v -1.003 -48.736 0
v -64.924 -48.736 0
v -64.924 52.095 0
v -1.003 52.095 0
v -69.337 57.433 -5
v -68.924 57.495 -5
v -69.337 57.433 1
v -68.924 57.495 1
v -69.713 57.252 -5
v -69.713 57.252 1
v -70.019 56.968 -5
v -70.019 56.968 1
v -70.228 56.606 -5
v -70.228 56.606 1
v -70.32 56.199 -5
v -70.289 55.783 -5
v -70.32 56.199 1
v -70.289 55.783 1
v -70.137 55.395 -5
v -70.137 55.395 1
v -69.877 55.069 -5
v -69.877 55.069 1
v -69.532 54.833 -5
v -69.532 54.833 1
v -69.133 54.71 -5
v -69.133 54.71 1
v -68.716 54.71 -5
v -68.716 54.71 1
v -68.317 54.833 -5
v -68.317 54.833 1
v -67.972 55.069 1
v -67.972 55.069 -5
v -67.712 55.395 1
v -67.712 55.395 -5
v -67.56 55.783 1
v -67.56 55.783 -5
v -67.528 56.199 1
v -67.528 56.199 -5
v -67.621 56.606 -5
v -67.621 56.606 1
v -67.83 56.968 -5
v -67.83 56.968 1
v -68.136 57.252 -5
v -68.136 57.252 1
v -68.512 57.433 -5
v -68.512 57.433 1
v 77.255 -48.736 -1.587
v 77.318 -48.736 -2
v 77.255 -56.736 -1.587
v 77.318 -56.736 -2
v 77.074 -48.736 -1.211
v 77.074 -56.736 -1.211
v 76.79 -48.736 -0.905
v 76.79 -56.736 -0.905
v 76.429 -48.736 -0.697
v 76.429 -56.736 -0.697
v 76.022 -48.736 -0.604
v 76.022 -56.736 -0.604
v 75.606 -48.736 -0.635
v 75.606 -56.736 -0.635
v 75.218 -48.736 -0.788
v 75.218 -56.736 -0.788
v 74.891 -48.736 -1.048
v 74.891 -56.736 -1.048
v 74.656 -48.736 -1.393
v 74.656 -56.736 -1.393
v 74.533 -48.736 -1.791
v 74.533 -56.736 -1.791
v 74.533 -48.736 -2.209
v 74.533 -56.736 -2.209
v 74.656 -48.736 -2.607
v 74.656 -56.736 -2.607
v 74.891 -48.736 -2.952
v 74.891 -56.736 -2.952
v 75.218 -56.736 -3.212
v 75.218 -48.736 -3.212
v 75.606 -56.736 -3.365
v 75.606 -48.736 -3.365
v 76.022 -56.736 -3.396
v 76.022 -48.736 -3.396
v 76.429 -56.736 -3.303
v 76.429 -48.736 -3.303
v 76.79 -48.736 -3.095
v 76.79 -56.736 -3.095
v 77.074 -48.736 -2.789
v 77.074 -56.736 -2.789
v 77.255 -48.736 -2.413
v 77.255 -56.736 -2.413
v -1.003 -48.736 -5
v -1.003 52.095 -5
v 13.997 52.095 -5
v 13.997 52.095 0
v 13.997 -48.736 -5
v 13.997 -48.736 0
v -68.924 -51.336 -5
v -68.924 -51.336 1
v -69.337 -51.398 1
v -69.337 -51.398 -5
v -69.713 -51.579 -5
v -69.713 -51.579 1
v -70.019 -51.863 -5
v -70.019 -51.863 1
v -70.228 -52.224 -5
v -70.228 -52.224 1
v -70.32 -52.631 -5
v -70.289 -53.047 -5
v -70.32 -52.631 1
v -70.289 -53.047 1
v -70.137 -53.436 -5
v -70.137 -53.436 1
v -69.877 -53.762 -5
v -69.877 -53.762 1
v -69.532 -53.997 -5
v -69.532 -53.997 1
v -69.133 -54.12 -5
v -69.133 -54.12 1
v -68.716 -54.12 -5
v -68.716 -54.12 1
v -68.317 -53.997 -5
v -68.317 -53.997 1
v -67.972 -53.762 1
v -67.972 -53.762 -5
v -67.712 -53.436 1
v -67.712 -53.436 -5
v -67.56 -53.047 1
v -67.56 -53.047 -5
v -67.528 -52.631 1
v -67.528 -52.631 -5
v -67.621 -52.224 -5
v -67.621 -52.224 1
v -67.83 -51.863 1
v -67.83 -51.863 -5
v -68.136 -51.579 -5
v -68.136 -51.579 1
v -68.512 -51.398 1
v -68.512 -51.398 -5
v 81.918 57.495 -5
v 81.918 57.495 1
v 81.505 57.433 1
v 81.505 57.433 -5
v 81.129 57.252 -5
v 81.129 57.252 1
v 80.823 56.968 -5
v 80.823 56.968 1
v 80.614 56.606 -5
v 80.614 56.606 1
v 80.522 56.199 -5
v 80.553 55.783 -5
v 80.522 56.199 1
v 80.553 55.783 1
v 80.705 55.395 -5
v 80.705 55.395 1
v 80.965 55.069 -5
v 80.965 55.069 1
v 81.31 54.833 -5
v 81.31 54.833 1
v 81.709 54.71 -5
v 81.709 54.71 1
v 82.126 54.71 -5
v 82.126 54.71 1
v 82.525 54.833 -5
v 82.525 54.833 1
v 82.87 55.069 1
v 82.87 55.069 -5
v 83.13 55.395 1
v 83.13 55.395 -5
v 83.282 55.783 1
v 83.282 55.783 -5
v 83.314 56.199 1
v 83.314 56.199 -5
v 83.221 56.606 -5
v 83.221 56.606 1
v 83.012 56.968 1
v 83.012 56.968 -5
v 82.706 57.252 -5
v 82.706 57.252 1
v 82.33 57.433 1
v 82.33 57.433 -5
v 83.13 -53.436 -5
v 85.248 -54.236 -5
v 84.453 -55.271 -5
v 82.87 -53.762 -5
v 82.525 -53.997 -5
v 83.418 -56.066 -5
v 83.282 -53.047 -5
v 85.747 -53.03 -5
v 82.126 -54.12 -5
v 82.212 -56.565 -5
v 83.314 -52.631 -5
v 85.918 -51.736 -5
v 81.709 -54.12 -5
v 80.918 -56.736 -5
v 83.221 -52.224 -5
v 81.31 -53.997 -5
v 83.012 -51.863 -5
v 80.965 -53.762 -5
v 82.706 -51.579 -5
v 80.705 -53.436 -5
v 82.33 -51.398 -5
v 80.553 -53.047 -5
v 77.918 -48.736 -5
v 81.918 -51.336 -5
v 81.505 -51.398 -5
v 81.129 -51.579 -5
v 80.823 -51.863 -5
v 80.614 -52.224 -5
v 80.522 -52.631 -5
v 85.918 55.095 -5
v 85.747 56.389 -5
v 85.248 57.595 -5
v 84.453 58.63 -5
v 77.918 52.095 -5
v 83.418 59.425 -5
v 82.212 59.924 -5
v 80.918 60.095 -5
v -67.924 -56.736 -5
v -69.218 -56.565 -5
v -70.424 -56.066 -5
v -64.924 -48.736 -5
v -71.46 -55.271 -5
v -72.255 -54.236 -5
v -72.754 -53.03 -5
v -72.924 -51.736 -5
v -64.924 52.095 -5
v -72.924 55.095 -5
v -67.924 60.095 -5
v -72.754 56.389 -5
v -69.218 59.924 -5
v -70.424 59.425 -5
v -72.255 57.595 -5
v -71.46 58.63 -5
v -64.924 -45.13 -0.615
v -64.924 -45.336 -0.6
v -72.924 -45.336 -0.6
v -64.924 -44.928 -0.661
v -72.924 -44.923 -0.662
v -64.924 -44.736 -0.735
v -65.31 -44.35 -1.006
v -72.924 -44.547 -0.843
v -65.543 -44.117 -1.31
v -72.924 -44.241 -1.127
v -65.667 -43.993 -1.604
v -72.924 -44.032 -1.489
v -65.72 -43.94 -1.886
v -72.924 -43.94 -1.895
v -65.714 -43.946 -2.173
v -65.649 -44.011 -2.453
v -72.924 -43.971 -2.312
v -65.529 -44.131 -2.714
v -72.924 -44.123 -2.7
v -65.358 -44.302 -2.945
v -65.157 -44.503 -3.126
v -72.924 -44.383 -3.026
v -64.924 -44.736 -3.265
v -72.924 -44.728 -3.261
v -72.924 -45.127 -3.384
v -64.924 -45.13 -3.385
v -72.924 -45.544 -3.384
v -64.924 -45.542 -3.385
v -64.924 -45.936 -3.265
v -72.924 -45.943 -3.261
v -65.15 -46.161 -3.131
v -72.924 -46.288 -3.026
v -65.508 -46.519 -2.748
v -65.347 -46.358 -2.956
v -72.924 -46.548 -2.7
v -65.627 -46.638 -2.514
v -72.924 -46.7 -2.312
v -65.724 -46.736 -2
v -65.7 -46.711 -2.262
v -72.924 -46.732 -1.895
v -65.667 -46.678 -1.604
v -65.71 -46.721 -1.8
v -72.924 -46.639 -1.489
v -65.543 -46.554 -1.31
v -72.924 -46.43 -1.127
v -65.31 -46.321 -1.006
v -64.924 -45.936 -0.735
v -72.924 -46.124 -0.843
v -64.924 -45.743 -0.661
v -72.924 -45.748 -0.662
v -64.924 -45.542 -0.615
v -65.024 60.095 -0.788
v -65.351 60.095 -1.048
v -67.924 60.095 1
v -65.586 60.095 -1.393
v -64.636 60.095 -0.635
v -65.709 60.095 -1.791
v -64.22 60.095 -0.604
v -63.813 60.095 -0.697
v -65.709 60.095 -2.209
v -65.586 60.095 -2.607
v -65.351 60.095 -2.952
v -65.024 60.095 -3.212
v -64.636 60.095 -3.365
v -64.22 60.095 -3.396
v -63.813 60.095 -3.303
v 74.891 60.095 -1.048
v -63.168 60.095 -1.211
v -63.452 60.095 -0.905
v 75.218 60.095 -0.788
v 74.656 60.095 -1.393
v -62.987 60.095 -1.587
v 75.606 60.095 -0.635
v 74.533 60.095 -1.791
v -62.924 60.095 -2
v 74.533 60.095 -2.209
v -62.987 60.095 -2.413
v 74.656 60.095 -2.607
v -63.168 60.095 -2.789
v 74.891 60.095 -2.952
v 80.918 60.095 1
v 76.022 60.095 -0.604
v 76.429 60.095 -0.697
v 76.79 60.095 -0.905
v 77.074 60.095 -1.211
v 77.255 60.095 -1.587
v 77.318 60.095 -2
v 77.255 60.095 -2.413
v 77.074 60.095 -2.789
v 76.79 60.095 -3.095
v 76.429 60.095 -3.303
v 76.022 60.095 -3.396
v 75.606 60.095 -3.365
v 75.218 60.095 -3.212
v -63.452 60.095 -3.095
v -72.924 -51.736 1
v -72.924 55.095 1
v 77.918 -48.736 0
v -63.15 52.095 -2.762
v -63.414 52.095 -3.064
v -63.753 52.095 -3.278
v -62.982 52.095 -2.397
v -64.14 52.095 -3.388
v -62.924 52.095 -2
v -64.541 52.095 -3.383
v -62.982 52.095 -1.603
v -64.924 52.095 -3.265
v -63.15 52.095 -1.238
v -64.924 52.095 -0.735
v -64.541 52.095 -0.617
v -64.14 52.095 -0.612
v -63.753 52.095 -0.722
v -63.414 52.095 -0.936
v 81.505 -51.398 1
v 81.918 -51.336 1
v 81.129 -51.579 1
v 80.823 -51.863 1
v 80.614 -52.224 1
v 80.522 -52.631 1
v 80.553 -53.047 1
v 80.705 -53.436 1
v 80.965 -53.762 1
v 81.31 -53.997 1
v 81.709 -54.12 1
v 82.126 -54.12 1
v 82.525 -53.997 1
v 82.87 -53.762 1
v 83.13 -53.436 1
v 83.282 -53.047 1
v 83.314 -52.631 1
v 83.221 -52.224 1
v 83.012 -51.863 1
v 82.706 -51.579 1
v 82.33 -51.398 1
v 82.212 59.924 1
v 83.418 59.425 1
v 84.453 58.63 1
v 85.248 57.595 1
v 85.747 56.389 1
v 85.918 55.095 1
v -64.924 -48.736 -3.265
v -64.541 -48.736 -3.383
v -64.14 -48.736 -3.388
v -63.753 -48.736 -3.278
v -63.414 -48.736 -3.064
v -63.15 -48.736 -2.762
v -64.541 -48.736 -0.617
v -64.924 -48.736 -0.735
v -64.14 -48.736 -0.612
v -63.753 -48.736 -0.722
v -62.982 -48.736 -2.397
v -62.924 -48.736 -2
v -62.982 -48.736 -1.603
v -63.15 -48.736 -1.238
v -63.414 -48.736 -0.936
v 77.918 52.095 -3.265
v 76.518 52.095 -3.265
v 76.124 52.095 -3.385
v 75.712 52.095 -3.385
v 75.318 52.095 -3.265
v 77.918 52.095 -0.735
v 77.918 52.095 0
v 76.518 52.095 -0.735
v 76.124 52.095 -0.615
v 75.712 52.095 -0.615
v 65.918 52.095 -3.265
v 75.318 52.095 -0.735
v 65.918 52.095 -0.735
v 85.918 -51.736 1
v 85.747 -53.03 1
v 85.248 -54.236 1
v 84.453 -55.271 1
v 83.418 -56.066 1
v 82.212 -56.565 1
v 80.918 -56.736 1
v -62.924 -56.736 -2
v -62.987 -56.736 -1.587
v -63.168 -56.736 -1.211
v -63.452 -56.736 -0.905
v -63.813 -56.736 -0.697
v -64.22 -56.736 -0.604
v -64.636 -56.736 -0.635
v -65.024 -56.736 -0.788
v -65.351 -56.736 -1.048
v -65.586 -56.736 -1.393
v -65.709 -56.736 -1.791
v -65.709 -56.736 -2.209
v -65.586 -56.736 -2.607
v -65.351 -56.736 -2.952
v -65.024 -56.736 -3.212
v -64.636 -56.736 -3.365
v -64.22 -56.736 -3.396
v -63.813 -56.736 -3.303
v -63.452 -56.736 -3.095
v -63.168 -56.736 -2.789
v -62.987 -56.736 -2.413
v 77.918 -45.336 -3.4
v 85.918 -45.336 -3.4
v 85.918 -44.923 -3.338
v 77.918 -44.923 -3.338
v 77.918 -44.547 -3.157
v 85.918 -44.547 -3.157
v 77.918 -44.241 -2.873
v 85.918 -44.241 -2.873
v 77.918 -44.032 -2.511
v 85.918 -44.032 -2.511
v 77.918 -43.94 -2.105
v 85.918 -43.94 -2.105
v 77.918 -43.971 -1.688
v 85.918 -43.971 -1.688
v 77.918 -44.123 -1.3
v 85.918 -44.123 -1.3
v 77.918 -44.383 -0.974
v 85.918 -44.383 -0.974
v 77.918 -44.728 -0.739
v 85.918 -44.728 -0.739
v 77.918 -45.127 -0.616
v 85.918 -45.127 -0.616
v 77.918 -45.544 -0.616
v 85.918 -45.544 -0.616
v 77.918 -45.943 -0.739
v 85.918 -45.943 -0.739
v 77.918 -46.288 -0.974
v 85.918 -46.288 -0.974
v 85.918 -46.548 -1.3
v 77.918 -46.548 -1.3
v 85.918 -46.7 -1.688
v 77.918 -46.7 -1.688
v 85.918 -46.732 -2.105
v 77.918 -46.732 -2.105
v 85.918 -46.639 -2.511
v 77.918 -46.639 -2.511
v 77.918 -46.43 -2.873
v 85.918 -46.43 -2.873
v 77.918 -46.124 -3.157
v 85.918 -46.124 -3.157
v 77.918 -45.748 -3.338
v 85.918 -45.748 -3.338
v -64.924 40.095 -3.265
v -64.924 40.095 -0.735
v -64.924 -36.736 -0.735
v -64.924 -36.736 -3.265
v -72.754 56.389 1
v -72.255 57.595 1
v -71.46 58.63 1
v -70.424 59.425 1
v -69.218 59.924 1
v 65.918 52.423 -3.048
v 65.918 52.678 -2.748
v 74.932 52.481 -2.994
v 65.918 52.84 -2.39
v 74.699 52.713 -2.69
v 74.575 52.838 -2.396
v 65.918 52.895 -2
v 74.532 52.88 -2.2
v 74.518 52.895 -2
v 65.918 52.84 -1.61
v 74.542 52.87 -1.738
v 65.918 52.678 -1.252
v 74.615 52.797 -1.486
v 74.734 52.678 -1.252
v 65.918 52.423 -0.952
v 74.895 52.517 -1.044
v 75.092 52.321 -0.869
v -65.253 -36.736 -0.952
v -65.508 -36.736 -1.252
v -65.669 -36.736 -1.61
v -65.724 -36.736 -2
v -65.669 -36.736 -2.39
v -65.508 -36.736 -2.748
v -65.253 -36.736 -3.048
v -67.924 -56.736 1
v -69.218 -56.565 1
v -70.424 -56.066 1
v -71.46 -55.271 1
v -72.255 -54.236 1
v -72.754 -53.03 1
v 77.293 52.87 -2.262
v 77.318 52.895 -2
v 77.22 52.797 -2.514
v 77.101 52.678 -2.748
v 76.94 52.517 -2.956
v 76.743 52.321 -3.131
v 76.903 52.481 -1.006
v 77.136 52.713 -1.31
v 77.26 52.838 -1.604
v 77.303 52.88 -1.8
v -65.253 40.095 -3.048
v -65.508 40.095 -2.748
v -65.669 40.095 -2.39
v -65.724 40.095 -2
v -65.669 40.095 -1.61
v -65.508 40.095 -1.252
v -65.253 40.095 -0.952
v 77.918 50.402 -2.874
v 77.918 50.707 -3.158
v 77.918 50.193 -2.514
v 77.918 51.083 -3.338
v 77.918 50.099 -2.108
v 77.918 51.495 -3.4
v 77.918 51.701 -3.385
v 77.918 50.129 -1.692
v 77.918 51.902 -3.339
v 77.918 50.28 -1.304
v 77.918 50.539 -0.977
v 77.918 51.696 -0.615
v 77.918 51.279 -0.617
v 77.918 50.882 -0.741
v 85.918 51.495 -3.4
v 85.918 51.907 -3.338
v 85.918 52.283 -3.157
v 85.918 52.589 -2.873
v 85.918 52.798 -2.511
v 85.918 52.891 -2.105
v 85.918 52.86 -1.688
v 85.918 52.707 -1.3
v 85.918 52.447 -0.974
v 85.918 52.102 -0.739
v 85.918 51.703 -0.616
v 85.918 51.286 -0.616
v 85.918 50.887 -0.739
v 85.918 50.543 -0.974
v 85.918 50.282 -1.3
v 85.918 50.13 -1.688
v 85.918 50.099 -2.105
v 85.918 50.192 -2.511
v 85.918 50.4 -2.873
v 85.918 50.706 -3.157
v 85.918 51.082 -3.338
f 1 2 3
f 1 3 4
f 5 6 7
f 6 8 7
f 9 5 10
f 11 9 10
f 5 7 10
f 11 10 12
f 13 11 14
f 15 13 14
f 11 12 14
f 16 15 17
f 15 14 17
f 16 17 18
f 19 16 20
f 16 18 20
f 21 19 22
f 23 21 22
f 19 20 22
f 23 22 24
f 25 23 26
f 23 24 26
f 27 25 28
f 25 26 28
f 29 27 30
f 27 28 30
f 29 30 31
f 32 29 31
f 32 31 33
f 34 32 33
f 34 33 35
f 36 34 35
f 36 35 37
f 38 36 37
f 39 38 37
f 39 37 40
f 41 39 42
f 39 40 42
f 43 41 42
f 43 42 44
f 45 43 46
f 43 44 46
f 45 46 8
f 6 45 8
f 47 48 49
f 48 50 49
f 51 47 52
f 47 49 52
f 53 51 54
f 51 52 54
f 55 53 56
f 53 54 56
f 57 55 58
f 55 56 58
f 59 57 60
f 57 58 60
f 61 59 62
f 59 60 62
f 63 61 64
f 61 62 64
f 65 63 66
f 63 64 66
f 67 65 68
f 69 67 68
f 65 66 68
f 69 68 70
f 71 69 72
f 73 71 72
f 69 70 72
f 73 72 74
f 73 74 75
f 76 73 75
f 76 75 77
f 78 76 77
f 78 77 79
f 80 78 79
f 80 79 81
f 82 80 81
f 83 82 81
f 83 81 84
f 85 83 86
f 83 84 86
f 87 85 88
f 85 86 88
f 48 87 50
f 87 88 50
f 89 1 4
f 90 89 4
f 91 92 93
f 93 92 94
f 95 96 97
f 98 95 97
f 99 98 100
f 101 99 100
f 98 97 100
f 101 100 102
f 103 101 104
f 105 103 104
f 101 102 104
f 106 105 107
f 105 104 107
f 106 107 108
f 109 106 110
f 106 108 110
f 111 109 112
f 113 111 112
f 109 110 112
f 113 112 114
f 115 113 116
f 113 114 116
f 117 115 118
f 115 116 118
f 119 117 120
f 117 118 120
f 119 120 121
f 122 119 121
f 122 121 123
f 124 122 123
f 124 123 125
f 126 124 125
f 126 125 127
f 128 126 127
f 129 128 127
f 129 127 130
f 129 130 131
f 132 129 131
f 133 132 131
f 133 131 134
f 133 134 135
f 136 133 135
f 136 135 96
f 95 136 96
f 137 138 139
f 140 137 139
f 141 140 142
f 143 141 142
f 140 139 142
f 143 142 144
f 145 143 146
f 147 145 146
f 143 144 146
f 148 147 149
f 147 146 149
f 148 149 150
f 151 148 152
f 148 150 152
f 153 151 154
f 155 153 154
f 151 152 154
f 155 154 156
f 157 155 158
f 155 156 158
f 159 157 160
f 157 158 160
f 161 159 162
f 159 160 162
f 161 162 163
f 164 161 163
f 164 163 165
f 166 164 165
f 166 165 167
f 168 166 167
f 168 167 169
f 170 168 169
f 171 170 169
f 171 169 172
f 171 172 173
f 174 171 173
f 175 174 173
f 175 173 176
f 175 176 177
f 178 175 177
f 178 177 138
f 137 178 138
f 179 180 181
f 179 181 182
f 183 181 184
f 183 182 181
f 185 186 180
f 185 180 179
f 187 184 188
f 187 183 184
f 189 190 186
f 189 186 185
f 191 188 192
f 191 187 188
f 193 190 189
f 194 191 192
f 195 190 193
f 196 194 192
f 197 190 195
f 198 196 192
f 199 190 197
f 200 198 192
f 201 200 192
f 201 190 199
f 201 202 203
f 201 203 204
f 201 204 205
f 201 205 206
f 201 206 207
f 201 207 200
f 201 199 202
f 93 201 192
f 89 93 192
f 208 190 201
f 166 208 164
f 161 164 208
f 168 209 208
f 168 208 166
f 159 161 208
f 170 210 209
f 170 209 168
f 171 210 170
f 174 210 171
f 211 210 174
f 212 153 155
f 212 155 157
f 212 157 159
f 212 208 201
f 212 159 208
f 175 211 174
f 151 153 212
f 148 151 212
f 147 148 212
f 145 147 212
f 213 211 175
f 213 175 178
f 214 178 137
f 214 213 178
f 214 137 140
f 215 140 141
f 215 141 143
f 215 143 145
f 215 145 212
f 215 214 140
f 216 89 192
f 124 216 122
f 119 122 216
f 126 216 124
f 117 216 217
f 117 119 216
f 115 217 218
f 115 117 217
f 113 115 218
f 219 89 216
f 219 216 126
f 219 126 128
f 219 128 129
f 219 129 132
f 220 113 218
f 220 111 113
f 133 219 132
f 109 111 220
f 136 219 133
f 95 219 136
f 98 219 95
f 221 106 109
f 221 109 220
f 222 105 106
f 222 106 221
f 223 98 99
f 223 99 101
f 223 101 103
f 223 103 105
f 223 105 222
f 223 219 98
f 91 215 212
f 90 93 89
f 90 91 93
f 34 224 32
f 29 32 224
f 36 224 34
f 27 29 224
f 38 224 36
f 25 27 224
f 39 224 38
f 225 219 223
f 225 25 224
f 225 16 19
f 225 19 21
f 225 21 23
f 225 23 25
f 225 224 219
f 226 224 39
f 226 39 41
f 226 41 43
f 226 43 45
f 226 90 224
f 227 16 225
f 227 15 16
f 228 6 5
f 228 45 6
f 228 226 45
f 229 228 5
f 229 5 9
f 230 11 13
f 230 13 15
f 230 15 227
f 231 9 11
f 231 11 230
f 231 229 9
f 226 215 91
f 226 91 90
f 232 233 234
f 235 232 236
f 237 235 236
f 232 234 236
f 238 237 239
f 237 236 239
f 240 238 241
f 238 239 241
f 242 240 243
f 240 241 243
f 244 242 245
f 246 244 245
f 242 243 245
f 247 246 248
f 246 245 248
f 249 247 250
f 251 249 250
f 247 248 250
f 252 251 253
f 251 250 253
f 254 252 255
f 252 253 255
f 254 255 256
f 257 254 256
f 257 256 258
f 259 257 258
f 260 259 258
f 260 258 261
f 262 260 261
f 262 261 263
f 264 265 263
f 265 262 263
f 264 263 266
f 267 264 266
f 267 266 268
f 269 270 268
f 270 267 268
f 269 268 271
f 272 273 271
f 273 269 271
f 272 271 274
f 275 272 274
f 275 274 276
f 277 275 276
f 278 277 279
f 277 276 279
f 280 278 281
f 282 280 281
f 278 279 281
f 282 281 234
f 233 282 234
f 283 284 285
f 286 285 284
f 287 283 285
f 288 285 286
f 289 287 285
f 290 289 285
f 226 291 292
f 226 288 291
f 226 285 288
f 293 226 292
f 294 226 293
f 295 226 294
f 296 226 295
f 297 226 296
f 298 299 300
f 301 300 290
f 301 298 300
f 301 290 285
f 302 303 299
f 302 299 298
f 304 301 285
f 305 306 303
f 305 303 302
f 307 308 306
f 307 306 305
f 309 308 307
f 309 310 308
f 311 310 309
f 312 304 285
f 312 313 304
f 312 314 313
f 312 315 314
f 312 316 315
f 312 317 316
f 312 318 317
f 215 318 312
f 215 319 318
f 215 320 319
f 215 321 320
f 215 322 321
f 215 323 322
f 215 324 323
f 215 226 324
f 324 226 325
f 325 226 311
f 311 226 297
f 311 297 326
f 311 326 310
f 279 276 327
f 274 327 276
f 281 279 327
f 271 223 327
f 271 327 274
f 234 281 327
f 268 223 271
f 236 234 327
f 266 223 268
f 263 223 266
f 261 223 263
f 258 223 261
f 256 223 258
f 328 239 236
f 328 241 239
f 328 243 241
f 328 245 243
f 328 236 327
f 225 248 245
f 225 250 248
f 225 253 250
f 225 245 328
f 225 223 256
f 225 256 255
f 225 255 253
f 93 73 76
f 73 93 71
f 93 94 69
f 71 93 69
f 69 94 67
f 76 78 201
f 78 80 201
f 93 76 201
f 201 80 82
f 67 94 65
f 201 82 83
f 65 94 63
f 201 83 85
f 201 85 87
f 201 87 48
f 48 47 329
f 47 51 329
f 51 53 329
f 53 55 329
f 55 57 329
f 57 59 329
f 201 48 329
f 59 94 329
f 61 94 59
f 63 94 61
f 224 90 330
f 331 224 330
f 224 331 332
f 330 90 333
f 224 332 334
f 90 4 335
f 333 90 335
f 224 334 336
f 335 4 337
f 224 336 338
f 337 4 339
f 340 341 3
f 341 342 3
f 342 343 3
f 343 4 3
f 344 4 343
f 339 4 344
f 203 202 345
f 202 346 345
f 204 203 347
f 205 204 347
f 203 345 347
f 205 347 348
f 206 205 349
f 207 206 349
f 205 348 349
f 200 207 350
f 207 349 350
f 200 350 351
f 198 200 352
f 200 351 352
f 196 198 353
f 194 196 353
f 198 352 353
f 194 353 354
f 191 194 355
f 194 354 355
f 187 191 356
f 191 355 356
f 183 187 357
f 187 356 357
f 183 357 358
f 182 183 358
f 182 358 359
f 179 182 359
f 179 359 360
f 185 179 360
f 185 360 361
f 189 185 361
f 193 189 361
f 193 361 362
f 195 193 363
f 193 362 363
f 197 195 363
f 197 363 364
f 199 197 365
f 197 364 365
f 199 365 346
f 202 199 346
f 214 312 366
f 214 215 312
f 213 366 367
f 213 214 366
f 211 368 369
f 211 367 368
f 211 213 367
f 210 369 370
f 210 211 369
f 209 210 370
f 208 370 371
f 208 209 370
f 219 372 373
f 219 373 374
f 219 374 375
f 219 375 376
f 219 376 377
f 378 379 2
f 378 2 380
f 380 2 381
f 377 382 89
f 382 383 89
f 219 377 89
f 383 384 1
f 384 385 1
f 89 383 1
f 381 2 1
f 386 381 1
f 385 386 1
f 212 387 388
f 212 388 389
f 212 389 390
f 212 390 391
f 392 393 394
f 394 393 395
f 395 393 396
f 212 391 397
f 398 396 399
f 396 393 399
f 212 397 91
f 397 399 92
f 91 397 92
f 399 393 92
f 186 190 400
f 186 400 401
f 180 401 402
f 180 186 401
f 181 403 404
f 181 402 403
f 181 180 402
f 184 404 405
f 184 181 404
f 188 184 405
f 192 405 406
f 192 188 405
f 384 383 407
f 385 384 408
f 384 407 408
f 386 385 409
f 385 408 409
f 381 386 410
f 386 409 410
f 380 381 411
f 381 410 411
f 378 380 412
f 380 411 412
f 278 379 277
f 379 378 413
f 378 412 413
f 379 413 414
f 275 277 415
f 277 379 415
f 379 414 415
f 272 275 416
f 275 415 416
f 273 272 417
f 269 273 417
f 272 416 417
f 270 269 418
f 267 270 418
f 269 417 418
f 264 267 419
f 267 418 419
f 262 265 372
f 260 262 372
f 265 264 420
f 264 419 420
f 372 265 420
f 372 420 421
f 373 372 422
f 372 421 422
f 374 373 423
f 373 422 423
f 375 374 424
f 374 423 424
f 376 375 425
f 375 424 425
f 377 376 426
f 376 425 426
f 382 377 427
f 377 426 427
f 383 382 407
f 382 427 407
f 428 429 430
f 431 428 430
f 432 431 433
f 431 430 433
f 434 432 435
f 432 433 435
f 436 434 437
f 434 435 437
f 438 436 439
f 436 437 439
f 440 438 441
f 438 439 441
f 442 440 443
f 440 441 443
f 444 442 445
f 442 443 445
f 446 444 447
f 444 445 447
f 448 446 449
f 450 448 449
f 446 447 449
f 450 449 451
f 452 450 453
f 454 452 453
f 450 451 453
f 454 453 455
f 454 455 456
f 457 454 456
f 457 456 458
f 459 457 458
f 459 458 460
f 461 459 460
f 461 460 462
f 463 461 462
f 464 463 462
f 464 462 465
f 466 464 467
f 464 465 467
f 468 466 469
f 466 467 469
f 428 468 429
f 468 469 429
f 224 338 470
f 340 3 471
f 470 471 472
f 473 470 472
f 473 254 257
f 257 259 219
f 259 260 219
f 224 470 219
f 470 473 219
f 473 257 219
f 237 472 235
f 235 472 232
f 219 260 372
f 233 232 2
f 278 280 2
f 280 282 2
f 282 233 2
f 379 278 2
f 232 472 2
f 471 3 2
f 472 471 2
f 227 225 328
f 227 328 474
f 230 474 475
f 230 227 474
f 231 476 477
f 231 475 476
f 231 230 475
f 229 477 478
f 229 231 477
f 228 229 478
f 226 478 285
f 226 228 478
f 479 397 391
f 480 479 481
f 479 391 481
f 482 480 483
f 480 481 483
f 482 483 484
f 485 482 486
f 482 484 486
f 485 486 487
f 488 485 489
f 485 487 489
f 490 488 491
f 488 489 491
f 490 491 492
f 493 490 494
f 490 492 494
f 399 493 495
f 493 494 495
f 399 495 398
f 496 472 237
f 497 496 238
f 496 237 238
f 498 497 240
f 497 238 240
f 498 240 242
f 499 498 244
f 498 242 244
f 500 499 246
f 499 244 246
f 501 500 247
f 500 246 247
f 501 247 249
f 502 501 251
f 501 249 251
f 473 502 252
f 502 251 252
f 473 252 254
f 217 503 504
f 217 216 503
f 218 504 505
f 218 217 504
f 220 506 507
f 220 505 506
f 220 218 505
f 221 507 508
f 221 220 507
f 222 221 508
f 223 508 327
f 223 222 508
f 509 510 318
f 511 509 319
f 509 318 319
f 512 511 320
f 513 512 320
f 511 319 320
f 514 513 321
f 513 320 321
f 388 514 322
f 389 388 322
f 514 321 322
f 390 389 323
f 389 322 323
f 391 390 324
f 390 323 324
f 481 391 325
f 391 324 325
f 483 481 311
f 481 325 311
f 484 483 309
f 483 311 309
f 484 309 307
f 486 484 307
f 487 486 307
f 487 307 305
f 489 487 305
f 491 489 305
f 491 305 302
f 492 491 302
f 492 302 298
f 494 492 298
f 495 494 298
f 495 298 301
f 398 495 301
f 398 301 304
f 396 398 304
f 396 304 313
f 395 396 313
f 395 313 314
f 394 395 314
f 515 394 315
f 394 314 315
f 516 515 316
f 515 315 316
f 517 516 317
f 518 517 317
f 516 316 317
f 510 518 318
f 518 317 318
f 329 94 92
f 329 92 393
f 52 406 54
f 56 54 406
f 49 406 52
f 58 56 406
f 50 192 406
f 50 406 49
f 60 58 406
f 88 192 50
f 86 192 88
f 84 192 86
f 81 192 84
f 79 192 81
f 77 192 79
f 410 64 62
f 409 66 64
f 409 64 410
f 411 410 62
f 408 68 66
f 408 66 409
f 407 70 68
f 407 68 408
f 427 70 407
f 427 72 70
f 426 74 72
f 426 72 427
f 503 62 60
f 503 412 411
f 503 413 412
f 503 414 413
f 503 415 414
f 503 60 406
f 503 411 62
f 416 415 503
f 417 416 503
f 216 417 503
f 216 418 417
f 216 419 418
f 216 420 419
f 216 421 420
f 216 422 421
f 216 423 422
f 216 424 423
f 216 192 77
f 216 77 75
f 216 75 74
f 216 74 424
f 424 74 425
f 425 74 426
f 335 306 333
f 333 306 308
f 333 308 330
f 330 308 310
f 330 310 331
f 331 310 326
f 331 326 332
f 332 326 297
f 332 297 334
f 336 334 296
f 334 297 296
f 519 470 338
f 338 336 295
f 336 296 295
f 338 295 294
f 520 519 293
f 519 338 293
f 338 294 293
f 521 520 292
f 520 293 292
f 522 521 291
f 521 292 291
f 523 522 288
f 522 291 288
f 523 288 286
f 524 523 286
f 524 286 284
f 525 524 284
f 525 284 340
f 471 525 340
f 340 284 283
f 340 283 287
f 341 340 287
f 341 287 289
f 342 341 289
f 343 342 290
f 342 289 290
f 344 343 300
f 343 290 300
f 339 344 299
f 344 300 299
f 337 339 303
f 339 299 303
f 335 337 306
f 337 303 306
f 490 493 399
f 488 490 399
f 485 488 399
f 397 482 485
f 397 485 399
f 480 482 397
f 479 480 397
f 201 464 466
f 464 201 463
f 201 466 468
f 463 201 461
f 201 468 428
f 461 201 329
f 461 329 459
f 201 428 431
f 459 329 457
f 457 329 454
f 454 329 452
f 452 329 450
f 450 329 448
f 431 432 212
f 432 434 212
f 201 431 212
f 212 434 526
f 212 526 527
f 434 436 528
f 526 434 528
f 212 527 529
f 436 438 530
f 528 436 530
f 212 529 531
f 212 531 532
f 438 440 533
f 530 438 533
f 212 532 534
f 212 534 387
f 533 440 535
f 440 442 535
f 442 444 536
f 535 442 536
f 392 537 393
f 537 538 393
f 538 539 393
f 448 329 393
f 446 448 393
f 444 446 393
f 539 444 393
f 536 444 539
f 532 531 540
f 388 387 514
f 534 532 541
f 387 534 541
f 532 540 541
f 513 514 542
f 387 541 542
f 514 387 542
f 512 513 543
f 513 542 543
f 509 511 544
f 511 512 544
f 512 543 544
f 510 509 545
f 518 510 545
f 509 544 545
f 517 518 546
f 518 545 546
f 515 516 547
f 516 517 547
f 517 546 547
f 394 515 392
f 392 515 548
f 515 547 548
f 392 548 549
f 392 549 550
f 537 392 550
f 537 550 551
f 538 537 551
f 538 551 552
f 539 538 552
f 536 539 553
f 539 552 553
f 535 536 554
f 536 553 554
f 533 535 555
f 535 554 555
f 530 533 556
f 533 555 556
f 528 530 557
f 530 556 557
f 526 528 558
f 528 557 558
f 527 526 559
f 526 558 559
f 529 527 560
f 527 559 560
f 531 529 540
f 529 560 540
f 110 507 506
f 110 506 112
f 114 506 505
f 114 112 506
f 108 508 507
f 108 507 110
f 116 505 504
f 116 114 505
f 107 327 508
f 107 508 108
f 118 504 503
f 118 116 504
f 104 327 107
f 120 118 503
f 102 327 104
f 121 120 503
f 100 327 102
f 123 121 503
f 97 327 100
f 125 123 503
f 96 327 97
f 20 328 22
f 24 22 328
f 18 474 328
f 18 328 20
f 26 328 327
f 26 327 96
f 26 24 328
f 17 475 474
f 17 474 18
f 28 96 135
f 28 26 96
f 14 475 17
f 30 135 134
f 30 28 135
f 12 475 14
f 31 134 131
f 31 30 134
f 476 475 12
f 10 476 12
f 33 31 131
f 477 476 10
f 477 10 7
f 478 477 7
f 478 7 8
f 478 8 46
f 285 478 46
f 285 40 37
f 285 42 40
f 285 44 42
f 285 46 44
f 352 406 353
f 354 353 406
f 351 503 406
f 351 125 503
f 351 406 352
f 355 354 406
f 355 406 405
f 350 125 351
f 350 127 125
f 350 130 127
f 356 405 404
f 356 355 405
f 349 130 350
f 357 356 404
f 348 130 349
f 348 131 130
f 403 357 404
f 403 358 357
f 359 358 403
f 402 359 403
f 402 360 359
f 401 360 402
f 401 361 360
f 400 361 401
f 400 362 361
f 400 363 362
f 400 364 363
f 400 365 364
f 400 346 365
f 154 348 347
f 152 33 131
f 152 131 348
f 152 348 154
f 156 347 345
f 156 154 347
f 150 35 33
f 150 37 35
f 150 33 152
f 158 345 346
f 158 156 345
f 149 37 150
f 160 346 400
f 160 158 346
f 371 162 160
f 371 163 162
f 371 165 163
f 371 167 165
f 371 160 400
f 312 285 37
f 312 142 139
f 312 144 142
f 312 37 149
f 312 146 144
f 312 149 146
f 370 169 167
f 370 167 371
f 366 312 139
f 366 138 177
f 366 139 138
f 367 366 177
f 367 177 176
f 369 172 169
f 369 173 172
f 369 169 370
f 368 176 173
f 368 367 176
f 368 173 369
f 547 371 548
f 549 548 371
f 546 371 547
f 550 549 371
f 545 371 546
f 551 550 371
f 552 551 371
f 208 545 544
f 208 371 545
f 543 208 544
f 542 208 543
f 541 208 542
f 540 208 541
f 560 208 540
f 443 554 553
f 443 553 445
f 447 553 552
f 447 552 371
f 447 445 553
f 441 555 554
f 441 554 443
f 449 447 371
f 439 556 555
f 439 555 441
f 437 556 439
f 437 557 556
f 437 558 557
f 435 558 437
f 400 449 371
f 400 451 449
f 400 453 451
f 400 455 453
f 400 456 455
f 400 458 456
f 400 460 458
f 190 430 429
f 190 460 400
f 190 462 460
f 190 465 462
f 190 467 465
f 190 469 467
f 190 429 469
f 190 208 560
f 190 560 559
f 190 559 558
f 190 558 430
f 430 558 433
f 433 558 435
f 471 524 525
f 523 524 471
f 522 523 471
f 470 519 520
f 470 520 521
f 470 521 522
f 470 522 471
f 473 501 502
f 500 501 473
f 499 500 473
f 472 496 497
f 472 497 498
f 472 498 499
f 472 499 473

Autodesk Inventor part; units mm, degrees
ref_plane "YZ Plane" through (0, 0, 0) normal (1, 0, 0) x (0, 1, 0)
ref_plane "XZ Plane" through (0, 0, 0) normal (0, 1, 0) x (-1, 0, 0)
ref_plane "XY Plane" through (0, 0, 0) normal (0, 0, 1) x (1, 0, 0)
sketch "Skizze1" plane through (0, 0, 0) normal (0, 0, 1) x (1, 0, 0)
  line L0 (63.945, 39.8) -> (63.945, -39.8) construction
  arc A0 (63.945, 39.8) -> (60.945, 42.8) centre (60.945, 39.8) ccw construction
  line L1 (-60.945, 42.8) -> (60.945, 42.8) construction
  arc A1 (-60.945, 42.8) -> (-63.945, 39.8) centre (-60.945, 39.8) ccw construction
  line L2 (-63.945, -39.8) -> (-63.945, 39.8) construction
  arc A2 (-63.945, -39.8) -> (-60.945, -42.8) centre (-60.945, -39.8) ccw construction
  line L3 (60.945, -42.8) -> (-60.945, -42.8) construction
  arc A3 (60.945, -42.8) -> (63.945, -39.8) centre (60.945, -39.8) ccw construction
  line L4 (-63.625, -39.48) -> (-63.625, 39.48) construction
  arc A4 (-60.625, 42.48) -> (-63.625, 39.48) centre (-60.625, 39.48) ccw construction
  line L5 (-60.625, 42.48) -> (60.625, 42.48) construction
  arc A5 (63.625, 39.48) -> (60.625, 42.48) centre (60.625, 39.48) ccw construction
  line L6 (63.625, 39.48) -> (63.625, -39.48) construction
  arc A6 (60.625, -42.48) -> (63.625, -39.48) centre (60.625, -39.48) ccw construction
  line L7 (60.625, -42.48) -> (-60.625, -42.48) construction
  arc A7 (-63.625, -39.48) -> (-60.625, -42.48) centre (-60.625, -39.48) ccw construction
  line L8 (-62.625, 39.48) -> (-62.625, -39.48) construction
  arc A8 (-62.625, -39.48) -> (-60.625, -41.48) centre (-60.625, -39.48) ccw construction
  line L9 (-60.625, -41.48) -> (60.625, -41.48) construction
  arc A9 (60.625, -41.48) -> (62.625, -39.48) centre (60.625, -39.48) ccw construction
  line L10 (62.625, -39.48) -> (62.625, 39.48) construction
  arc A10 (62.625, 39.48) -> (60.625, 41.48) centre (60.625, 39.48) ccw construction
  line L11 (60.625, 41.48) -> (-60.625, 41.48) construction
  arc A11 (-60.625, 41.48) -> (-62.625, 39.48) centre (-60.625, 39.48) ccw construction
  line L12 (75.9176, 38) -> (78.9176, 41) construction
  line L13 (75.9176, 38) -> (66.9176, 38) construction
  line L14 (63.9176, 35) -> (66.9176, 38) construction
  line L15 (63.9176, 35) -> (63.9176, -34.9) construction
  line L16 (66.9176, -37.9) -> (63.9176, -34.9) construction
  line L17 (66.9176, -37.9) -> (75.9176, -37.9) construction
  line L18 (78.9176, -40.9) -> (75.9176, -37.9) construction
  line L19 (78.9176, -40.9) -> (78.9176, -45.7356) construction
  arc A12 (74.9176, -49.7356) -> (78.9176, -45.7356) centre (74.9176, -45.7356) ccw construction
  line L20 (74.9176, -49.7356) -> (-61.9244, -49.7356) construction
  arc A13 (-65.9244, -45.7356) -> (-61.9244, -49.7356) centre (-61.9244, -45.7356) ccw projected
  line L21 (-65.9244, -45.7356) -> (-65.9244, -40.9) projected
  line L22 (-62.9244, -37.9) -> (-65.9244, -40.9) projected
  line L23 (-62.9244, -37.9) -> (-58.9244, -37.9) construction
  line L24 (-55.9244, -34.9) -> (-58.9244, -37.9) construction
  line L25 (-55.9244, -34.9) -> (-55.9244, 35) construction
  line L26 (-58.9244, 38) -> (-55.9244, 35) construction
  line L27 (-58.9244, 38) -> (-62.9244, 38) construction
  line L28 (-65.9244, 41) -> (-62.9244, 38) projected
  line L29 (-65.9244, 41) -> (-65.9244, 49.0948) projected
  arc A14 (-61.9244, 53.0948) -> (-65.9244, 49.0948) centre (-61.9244, 49.0948) ccw projected
  line L30 (-61.9244, 53.0948) -> (74.9176, 53.0948) construction
  arc A15 (78.9176, 49.0948) -> (74.9176, 53.0948) centre (74.9176, 49.0948) ccw construction
  line L31 (78.9176, 49.0948) -> (78.9176, 41) construction
  circle A16 centre (-62.4244, 49.5948) radius 1.4 construction
  circle A17 centre (-62.4244, -46.2356) radius 1.4 construction
  circle A18 centre (75.4176, -46.2356) radius 1.4 construction
  circle A19 centre (75.4176, 49.5948) radius 1.5 construction
  circle A20 centre (45.2899, -42.9) radius 1.4 construction
  circle A21 centre (45.2899, 43) radius 1.4 construction
  line L32 (54.6, 38) -> (44.6, 38) construction
  line L33 (44.6, 38) -> (44.6, -37.9) construction
  line L34 (44.6, -37.9) -> (54.6, -37.9) construction
  line L35 (54.6, -37.9) -> (54.6, 38) construction
  circle A22 centre (26.5899, 43) radius 1.4 construction
  circle A23 centre (26.5899, -42.9) radius 1.4 construction
  line L36 (25.9, -37.9) -> (35.9, -37.9) construction
  line L37 (35.9, -37.9) -> (35.9, 38) construction
  line L38 (35.9, 38) -> (25.9, 38) construction
  line L39 (25.9, 38) -> (25.9, -37.9) construction
  circle A24 centre (7.8899, 43) radius 1.4 construction
  circle A25 centre (7.8899, -42.9) radius 1.4 construction
  line L40 (7.2, -37.9) -> (17.2, -37.9) construction
  line L41 (17.2, -37.9) -> (17.2, 38) construction
  line L42 (17.2, 38) -> (7.2, 38) construction
  line L43 (7.2, 38) -> (7.2, -37.9) construction
  circle A26 centre (-10.8101, 43) radius 1.4 construction
  circle A27 centre (-10.8101, -42.9) radius 1.4 construction
  line L44 (-11.5, -37.9) -> (-1.5, -37.9) construction
  line L45 (-1.5, -37.9) -> (-1.5, 38) construction
  line L46 (-1.5, 38) -> (-11.5, 38) construction
  line L47 (-11.5, 38) -> (-11.5, -37.9) construction
  circle A28 centre (-29.5101, 43) radius 1.4 construction
  circle A29 centre (-29.5101, -42.9) radius 1.4 construction
  line L48 (-30.2, -37.9) -> (-20.2, -37.9) construction
  line L49 (-20.2, -37.9) -> (-20.2, 38) construction
  line L50 (-20.2, 38) -> (-30.2, 38) construction
  line L51 (-30.2, 38) -> (-30.2, -37.9) construction
  circle A30 centre (-48.2101, 43) radius 1.4 construction
  circle A31 centre (-48.2101, -42.9) radius 1.4 construction
  line L52 (-48.9, -37.9) -> (-38.9, -37.9) construction
  line L53 (-38.9, -37.9) -> (-38.9, 38) construction
  line L54 (-38.9, 38) -> (-48.9, 38) construction
  line L55 (-48.9, 38) -> (-48.9, -37.9) construction
  line L56 (74.9176, 55.0948) -> (-61.9244, 55.0948) construction
  arc A32 (-61.9244, 55.0948) -> (-67.9244, 49.0948) centre (-61.9244, 49.0948) ccw
  line L57 (-67.9244, 49.0948) -> (-67.9244, 40.1716)
  line L58 (-67.9244, 40.1716) -> (-63.7528, 36)
  line L59 (-63.7528, 36) -> (-59.7528, 36) construction
  line L60 (-59.7528, 36) -> (-57.9244, 34.1716) construction
  line L61 (-57.9244, 34.1716) -> (-57.9244, -34.0716) construction
  line L62 (-57.9244, -34.0716) -> (-59.7528, -35.9) construction
  line L63 (-59.7528, -35.9) -> (-63.7528, -35.9) construction
  line L64 (-63.7528, -35.9) -> (-67.9244, -40.0716)
  line L65 (-67.9244, -40.0716) -> (-67.9244, -45.7356)
  arc A33 (-67.9244, -45.7356) -> (-61.9244, -51.7356) centre (-61.9244, -45.7356) ccw
  line L66 (-61.9244, -51.7356) -> (74.9176, -51.7356) construction
  arc A34 (74.9176, -51.7356) -> (80.9176, -45.7356) centre (74.9176, -45.7356) ccw construction
  line L67 (80.9176, -45.7356) -> (80.9176, -40.0716) construction
  line L68 (80.9176, -40.0716) -> (76.746, -35.9) construction
  line L69 (76.746, -35.9) -> (67.746, -35.9) construction
  line L70 (67.746, -35.9) -> (65.9176, -34.0716) construction
  line L71 (65.9176, -34.0716) -> (65.9176, 34.1716) construction
  line L72 (65.9176, 34.1716) -> (67.746, 36) construction
  line L73 (67.746, 36) -> (76.746, 36) construction
  line L74 (76.746, 36) -> (80.9176, 40.1716) construction
  line L75 (80.9176, 40.1716) -> (80.9176, 49.0948) construction
  arc A35 (80.9176, 49.0948) -> (74.9176, 55.0948) centre (74.9176, 49.0948) ccw construction
  line L76 (-61.9244, 60.0948) -> (74.9176, 60.0948) construction
  arc A36 (85.9176, 49.0948) -> (74.9176, 60.0948) centre (74.9176, 49.0948) ccw construction
  line L77 (85.9176, 49.0948) -> (85.9176, 38.1005) construction
  line L78 (85.9176, 38.1005) -> (78.8171, 31) construction
  line L79 (78.8171, 31) -> (70.9176, 31) construction
  line L80 (70.9176, 31) -> (70.9176, -30.9) construction
  line L81 (70.9176, -30.9) -> (78.8171, -30.9) construction
  line L82 (78.8171, -30.9) -> (85.9176, -38.0005) construction
  line L83 (85.9176, -38.0005) -> (85.9176, -45.7356) construction
  arc A37 (74.9176, -56.7356) -> (85.9176, -45.7356) centre (74.9176, -45.7356) ccw construction
  line L84 (74.9176, -56.7356) -> (-61.9244, -56.7356) construction
  arc A38 (-72.9244, -45.7356) -> (-61.9244, -56.7356) centre (-61.9244, -45.7356) ccw construction
  line L85 (-72.9244, -45.7356) -> (-72.9244, -38.0005) construction
  line L86 (-72.9244, -38.0005) -> (-65.8239, -30.9) construction
  line L87 (-65.8239, -30.9) -> (-62.9244, -30.9) construction
  line L88 (-62.9244, -30.9) -> (-62.9244, 31) construction
  line L89 (-62.9244, 31) -> (-65.8239, 31) construction
  line L90 (-65.8239, 31) -> (-72.9244, 38.1005) construction
  line L91 (-72.9244, 38.1005) -> (-72.9244, 49.0948) construction
  arc A39 (-61.9244, 60.0948) -> (-72.9244, 49.0948) centre (-61.9244, 49.0948) ccw construction
  line L92 (-67.9244, 60.0948) -> (80.9176, 60.0948)
  line L93 (85.9176, 55.0948) -> (85.9176, -51.7356)
  line L94 (80.9176, -56.7356) -> (-67.9244, -56.7356)
  line L95 (-72.9244, -51.7356) -> (-72.9244, 55.0948)
  arc A40 (-67.9244, 60.0948) -> (-72.9244, 55.0948) centre (-67.9244, 55.0948) ccw
  arc A41 (85.9176, 55.0948) -> (80.9176, 60.0948) centre (80.9176, 55.0948) ccw
  arc A42 (80.9176, -56.7356) -> (85.9176, -51.7356) centre (80.9176, -51.7356) ccw
  arc A43 (-72.9244, -51.7356) -> (-67.9244, -56.7356) centre (-67.9244, -51.7356) ccw
  line L96 (-60.625, -39.48) -> (60.625, -39.48)
  line L97 (60.625, -39.48) -> (60.625, 39.48)
  line L98 (60.625, 39.48) -> (-60.625, 39.48)
  line L99 (-60.625, 39.48) -> (-60.625, -39.48)
  point P0 (0, 0)
  dimension "d0" = 1
  dimension "d1" = 2
  dimension "d2" = 5
  dimension "d3" = 5
extrude "Extrusion1" add sketch "Skizze1" along normal blind 1 contours L92 A41 L93 A42 L94 A43 L95 A40 | L99 L98 L97 L96
sketch "Skizze2" plane through (0, 0, 0) normal (0, 0, -1) x (-1, 0, 0)
  line L0 (67.9244, -56.7356) -> (-80.9176, -56.7356) projected
  arc A0 (67.9244, -56.7356) -> (72.9244, -51.7356) centre (67.9244, -51.7356) ccw projected
  line L1 (72.9244, 55.0948) -> (72.9244, -51.7356) projected
  arc A1 (72.9244, 55.0948) -> (67.9244, 60.0948) centre (67.9244, 55.0948) ccw projected
  line L2 (-80.9176, 60.0948) -> (67.9244, 60.0948) projected
  arc A2 (-80.9176, 60.0948) -> (-85.9176, 55.0948) centre (-80.9176, 55.0948) ccw projected
  line L3 (-85.9176, -51.7356) -> (-85.9176, 55.0948) projected
  arc A3 (-85.9176, -51.7356) -> (-80.9176, -56.7356) centre (-80.9176, -51.7356) ccw projected
  line L4 (-77.9176, 52.0948) -> (64.9244, 52.0948)
  line L5 (64.9244, 52.0948) -> (64.9244, -48.7356)
  line L6 (64.9244, -48.7356) -> (-77.9176, -48.7356)
  line L7 (-77.9176, -48.7356) -> (-77.9176, 52.0948)
  line L8 (-13.9966, 37.0948) -> (1.0034, 37.0948)
  line L9 (1.0034, 37.0948) -> (1.0034, 52.0948)
  line L10 (1.0034, 52.0948) -> (-13.9966, 52.0948)
  line L11 (-13.9966, 52.0948) -> (-13.9966, 37.0948)
  line L12 (-13.9966, 37.0948) -> (1.0034, 52.0948) construction
  line L13 (1.0034, 37.0948) -> (-13.9966, 52.0948) construction
  line L14 (-13.9966, -48.7356) -> (1.0034, -48.7356)
  line L15 (1.0034, -48.7356) -> (1.0034, 52.0948)
  line L16 (1.0034, 52.0948) -> (-13.9966, 52.0948)
  line L17 (-13.9966, 52.0948) -> (-13.9966, -48.7356)
  line L18 (-13.9966, -48.7356) -> (1.0034, 52.0948) construction
  line L19 (1.0034, -48.7356) -> (-13.9966, 52.0948) construction
  point P0 (-6.4966, 44.5948)
  point P1 (-6.4966, 1.6796)
  point P2 (1.0034, 37.0948)
  dimension "d42" = 8
  dimension "d43" = 15
  dimension "d44" = 15
extrude "Extrusion2" add sketch "Skizze2" along normal blind 5 contours L0 A3 L3 A2 L2 A1 L1 A0 | L4 L9 L8 L11 | L8 L15 L6 L17
sketch "Skizze3" plane through (0, 0, -5) normal (0, 0, -1) x (-1, 0, 0)
  line L0 (67.9244, 60.0948) -> (-80.9176, 60.0948) projected
  arc A0 (-80.9176, 60.0948) -> (-85.9176, 55.0948) centre (-80.9176, 55.0948) ccw projected
  line L1 (-85.9176, 55.0948) -> (-85.9176, -51.7356) projected
  arc A1 (-85.9176, -51.7356) -> (-80.9176, -56.7356) centre (-80.9176, -51.7356) ccw projected
  line L2 (-80.9176, -56.7356) -> (67.9244, -56.7356) projected
  arc A2 (67.9244, -56.7356) -> (72.9244, -51.7356) centre (67.9244, -51.7356) ccw projected
  line L3 (72.9244, -51.7356) -> (72.9244, 55.0948) projected
  arc A3 (72.9244, 55.0948) -> (67.9244, 60.0948) centre (67.9244, 55.0948) ccw projected
  line L4 (-60.945, 43.8) -> (60.945, 43.8) projected
  arc A4 (64.945, 39.8) -> (60.945, 43.8) centre (60.945, 39.8) ccw projected
  line L5 (64.945, 39.8) -> (64.945, -39.8) projected
  arc A5 (60.945, -43.8) -> (64.945, -39.8) centre (60.945, -39.8) ccw projected
  line L6 (60.945, -43.8) -> (-60.945, -43.8) projected
  arc A6 (-64.945, -39.8) -> (-60.945, -43.8) centre (-60.945, -39.8) ccw projected
  line L7 (-64.945, -39.8) -> (-64.945, 39.8) projected
  arc A7 (-60.945, 43.8) -> (-64.945, 39.8) centre (-60.945, 39.8) ccw projected
  circle A8 centre (68.9244, -52.7356) radius 1.4
  circle A9 centre (68.9244, 56.0948) radius 1.4
  circle A10 centre (-81.9176, 56.0948) radius 1.4
  circle A11 centre (-81.9176, -52.7356) radius 1.4
  point P0 (0, 0)
  dimension "d9" = 2.8
  dimension "d10" = 2.8
  dimension "d11" = 2.8
  dimension "d12" = 2.8
  dimension "d13" = 4
  dimension "d14" = 4
  dimension "d15" = 4
  dimension "d16" = 4
  dimension "d17" = 4
  dimension "d18" = 4
  dimension "d19" = 4
  dimension "d20" = 4
hole "Bohrung1" at (-68.9244, -52.7356, -5) at (81.9176, -52.7356, -5) at (81.9176, 56.0948, -5) at (-68.9244, 56.0948, -5) direction (0, 0, 1) diameter 2.8 end through all
sketch "Skizze4" plane through (-67.9244, 60.0948, 1) normal (0, 1, 0) x (1, 0, 0)
  circle A0 centre (143.842, -102.2347) radius 1.4 projected
  circle A1 centre (5, -102.2347) radius 1.4 projected
  line L0 (148.842, -98.2347) -> (0, -98.2347) projected
  line L1 (0, -98.2347) -> (0, -106.2347) projected
  line L2 (148.842, -106.2347) -> (0, -106.2347) projected
  line L3 (148.842, -98.2347) -> (148.842, -106.2347) projected
  circle A2 centre (3.6, 3) radius 1.4
  line L4 (0, 6) -> (148.842, 6) projected
  circle A3 centre (143.842, 3) radius 1.4
  point P0 (67.9244, 1)
  dimension "d28" = 2.8
  dimension "d29" = 3
  dimension "d30" = 2.8
extrude "Extrusion3" cut sketch "Skizze4" against normal blind 20 contours A2 | A3
sketch "Skizze5" plane through (-67.9244, -56.7356, 1) normal (0, -1, 0) x (1, 0, 0)
  circle A0 centre (143.842, -3) radius 1.4 projected
  circle A1 centre (3.6, -3) radius 1.4 projected
  point P0 (67.9244, -1)
extrude "Extrusion4" cut sketch "Skizze5" against normal blind 20
sketch "Skizze6" plane through (85.9176, -51.7356, 1) normal (1, 0, 0) x (0, 0, -1)
  circle A0 centre (-102.2347, 101.8304) radius 1.4 projected
  circle A1 centre (-102.2347, 5) radius 1.4 projected
  circle A2 centre (3, 103.2304) radius 1.4
  line L0 (6, 106.8304) -> (6, 0) projected
  circle A3 centre (3, 6.4) radius 1.4
  point P0 (1, 51.7356)
  dimension "d35" = 2.8
  dimension "d36" = 3
  dimension "d37" = 2.8
extrude "Extrusion5" cut sketch "Skizze6" against normal blind 20 contours A2 | A3
sketch "Skizze7" plane through (-72.9244, -51.7356, 1) normal (-1, 0, 0) x (0, 0, 1)
  line L0 (-4.4, -5) -> (-4.4, 3) projected
  circle A0 centre (-3, 6.4) radius 1.4 projected
  arc A1 (-1.7351, 103.8304) -> (-4.2649, 103.8304) centre (-3, 103.2304) ccw projected
  point P0 (-1, 51.7356)
extrude "Extrusion6" cut sketch "Skizze7" against normal blind 20
equation "\"d29\" = 0.5 * a3 + 0.5 * a2"
equation "\"d36\" = 0.5 * a3 + 0.5 * a2"
equation "\"a3\" = 5"
equation "\"a2\" = 1"
properties part number "Omniscope_USBC_Illuminationunit"
